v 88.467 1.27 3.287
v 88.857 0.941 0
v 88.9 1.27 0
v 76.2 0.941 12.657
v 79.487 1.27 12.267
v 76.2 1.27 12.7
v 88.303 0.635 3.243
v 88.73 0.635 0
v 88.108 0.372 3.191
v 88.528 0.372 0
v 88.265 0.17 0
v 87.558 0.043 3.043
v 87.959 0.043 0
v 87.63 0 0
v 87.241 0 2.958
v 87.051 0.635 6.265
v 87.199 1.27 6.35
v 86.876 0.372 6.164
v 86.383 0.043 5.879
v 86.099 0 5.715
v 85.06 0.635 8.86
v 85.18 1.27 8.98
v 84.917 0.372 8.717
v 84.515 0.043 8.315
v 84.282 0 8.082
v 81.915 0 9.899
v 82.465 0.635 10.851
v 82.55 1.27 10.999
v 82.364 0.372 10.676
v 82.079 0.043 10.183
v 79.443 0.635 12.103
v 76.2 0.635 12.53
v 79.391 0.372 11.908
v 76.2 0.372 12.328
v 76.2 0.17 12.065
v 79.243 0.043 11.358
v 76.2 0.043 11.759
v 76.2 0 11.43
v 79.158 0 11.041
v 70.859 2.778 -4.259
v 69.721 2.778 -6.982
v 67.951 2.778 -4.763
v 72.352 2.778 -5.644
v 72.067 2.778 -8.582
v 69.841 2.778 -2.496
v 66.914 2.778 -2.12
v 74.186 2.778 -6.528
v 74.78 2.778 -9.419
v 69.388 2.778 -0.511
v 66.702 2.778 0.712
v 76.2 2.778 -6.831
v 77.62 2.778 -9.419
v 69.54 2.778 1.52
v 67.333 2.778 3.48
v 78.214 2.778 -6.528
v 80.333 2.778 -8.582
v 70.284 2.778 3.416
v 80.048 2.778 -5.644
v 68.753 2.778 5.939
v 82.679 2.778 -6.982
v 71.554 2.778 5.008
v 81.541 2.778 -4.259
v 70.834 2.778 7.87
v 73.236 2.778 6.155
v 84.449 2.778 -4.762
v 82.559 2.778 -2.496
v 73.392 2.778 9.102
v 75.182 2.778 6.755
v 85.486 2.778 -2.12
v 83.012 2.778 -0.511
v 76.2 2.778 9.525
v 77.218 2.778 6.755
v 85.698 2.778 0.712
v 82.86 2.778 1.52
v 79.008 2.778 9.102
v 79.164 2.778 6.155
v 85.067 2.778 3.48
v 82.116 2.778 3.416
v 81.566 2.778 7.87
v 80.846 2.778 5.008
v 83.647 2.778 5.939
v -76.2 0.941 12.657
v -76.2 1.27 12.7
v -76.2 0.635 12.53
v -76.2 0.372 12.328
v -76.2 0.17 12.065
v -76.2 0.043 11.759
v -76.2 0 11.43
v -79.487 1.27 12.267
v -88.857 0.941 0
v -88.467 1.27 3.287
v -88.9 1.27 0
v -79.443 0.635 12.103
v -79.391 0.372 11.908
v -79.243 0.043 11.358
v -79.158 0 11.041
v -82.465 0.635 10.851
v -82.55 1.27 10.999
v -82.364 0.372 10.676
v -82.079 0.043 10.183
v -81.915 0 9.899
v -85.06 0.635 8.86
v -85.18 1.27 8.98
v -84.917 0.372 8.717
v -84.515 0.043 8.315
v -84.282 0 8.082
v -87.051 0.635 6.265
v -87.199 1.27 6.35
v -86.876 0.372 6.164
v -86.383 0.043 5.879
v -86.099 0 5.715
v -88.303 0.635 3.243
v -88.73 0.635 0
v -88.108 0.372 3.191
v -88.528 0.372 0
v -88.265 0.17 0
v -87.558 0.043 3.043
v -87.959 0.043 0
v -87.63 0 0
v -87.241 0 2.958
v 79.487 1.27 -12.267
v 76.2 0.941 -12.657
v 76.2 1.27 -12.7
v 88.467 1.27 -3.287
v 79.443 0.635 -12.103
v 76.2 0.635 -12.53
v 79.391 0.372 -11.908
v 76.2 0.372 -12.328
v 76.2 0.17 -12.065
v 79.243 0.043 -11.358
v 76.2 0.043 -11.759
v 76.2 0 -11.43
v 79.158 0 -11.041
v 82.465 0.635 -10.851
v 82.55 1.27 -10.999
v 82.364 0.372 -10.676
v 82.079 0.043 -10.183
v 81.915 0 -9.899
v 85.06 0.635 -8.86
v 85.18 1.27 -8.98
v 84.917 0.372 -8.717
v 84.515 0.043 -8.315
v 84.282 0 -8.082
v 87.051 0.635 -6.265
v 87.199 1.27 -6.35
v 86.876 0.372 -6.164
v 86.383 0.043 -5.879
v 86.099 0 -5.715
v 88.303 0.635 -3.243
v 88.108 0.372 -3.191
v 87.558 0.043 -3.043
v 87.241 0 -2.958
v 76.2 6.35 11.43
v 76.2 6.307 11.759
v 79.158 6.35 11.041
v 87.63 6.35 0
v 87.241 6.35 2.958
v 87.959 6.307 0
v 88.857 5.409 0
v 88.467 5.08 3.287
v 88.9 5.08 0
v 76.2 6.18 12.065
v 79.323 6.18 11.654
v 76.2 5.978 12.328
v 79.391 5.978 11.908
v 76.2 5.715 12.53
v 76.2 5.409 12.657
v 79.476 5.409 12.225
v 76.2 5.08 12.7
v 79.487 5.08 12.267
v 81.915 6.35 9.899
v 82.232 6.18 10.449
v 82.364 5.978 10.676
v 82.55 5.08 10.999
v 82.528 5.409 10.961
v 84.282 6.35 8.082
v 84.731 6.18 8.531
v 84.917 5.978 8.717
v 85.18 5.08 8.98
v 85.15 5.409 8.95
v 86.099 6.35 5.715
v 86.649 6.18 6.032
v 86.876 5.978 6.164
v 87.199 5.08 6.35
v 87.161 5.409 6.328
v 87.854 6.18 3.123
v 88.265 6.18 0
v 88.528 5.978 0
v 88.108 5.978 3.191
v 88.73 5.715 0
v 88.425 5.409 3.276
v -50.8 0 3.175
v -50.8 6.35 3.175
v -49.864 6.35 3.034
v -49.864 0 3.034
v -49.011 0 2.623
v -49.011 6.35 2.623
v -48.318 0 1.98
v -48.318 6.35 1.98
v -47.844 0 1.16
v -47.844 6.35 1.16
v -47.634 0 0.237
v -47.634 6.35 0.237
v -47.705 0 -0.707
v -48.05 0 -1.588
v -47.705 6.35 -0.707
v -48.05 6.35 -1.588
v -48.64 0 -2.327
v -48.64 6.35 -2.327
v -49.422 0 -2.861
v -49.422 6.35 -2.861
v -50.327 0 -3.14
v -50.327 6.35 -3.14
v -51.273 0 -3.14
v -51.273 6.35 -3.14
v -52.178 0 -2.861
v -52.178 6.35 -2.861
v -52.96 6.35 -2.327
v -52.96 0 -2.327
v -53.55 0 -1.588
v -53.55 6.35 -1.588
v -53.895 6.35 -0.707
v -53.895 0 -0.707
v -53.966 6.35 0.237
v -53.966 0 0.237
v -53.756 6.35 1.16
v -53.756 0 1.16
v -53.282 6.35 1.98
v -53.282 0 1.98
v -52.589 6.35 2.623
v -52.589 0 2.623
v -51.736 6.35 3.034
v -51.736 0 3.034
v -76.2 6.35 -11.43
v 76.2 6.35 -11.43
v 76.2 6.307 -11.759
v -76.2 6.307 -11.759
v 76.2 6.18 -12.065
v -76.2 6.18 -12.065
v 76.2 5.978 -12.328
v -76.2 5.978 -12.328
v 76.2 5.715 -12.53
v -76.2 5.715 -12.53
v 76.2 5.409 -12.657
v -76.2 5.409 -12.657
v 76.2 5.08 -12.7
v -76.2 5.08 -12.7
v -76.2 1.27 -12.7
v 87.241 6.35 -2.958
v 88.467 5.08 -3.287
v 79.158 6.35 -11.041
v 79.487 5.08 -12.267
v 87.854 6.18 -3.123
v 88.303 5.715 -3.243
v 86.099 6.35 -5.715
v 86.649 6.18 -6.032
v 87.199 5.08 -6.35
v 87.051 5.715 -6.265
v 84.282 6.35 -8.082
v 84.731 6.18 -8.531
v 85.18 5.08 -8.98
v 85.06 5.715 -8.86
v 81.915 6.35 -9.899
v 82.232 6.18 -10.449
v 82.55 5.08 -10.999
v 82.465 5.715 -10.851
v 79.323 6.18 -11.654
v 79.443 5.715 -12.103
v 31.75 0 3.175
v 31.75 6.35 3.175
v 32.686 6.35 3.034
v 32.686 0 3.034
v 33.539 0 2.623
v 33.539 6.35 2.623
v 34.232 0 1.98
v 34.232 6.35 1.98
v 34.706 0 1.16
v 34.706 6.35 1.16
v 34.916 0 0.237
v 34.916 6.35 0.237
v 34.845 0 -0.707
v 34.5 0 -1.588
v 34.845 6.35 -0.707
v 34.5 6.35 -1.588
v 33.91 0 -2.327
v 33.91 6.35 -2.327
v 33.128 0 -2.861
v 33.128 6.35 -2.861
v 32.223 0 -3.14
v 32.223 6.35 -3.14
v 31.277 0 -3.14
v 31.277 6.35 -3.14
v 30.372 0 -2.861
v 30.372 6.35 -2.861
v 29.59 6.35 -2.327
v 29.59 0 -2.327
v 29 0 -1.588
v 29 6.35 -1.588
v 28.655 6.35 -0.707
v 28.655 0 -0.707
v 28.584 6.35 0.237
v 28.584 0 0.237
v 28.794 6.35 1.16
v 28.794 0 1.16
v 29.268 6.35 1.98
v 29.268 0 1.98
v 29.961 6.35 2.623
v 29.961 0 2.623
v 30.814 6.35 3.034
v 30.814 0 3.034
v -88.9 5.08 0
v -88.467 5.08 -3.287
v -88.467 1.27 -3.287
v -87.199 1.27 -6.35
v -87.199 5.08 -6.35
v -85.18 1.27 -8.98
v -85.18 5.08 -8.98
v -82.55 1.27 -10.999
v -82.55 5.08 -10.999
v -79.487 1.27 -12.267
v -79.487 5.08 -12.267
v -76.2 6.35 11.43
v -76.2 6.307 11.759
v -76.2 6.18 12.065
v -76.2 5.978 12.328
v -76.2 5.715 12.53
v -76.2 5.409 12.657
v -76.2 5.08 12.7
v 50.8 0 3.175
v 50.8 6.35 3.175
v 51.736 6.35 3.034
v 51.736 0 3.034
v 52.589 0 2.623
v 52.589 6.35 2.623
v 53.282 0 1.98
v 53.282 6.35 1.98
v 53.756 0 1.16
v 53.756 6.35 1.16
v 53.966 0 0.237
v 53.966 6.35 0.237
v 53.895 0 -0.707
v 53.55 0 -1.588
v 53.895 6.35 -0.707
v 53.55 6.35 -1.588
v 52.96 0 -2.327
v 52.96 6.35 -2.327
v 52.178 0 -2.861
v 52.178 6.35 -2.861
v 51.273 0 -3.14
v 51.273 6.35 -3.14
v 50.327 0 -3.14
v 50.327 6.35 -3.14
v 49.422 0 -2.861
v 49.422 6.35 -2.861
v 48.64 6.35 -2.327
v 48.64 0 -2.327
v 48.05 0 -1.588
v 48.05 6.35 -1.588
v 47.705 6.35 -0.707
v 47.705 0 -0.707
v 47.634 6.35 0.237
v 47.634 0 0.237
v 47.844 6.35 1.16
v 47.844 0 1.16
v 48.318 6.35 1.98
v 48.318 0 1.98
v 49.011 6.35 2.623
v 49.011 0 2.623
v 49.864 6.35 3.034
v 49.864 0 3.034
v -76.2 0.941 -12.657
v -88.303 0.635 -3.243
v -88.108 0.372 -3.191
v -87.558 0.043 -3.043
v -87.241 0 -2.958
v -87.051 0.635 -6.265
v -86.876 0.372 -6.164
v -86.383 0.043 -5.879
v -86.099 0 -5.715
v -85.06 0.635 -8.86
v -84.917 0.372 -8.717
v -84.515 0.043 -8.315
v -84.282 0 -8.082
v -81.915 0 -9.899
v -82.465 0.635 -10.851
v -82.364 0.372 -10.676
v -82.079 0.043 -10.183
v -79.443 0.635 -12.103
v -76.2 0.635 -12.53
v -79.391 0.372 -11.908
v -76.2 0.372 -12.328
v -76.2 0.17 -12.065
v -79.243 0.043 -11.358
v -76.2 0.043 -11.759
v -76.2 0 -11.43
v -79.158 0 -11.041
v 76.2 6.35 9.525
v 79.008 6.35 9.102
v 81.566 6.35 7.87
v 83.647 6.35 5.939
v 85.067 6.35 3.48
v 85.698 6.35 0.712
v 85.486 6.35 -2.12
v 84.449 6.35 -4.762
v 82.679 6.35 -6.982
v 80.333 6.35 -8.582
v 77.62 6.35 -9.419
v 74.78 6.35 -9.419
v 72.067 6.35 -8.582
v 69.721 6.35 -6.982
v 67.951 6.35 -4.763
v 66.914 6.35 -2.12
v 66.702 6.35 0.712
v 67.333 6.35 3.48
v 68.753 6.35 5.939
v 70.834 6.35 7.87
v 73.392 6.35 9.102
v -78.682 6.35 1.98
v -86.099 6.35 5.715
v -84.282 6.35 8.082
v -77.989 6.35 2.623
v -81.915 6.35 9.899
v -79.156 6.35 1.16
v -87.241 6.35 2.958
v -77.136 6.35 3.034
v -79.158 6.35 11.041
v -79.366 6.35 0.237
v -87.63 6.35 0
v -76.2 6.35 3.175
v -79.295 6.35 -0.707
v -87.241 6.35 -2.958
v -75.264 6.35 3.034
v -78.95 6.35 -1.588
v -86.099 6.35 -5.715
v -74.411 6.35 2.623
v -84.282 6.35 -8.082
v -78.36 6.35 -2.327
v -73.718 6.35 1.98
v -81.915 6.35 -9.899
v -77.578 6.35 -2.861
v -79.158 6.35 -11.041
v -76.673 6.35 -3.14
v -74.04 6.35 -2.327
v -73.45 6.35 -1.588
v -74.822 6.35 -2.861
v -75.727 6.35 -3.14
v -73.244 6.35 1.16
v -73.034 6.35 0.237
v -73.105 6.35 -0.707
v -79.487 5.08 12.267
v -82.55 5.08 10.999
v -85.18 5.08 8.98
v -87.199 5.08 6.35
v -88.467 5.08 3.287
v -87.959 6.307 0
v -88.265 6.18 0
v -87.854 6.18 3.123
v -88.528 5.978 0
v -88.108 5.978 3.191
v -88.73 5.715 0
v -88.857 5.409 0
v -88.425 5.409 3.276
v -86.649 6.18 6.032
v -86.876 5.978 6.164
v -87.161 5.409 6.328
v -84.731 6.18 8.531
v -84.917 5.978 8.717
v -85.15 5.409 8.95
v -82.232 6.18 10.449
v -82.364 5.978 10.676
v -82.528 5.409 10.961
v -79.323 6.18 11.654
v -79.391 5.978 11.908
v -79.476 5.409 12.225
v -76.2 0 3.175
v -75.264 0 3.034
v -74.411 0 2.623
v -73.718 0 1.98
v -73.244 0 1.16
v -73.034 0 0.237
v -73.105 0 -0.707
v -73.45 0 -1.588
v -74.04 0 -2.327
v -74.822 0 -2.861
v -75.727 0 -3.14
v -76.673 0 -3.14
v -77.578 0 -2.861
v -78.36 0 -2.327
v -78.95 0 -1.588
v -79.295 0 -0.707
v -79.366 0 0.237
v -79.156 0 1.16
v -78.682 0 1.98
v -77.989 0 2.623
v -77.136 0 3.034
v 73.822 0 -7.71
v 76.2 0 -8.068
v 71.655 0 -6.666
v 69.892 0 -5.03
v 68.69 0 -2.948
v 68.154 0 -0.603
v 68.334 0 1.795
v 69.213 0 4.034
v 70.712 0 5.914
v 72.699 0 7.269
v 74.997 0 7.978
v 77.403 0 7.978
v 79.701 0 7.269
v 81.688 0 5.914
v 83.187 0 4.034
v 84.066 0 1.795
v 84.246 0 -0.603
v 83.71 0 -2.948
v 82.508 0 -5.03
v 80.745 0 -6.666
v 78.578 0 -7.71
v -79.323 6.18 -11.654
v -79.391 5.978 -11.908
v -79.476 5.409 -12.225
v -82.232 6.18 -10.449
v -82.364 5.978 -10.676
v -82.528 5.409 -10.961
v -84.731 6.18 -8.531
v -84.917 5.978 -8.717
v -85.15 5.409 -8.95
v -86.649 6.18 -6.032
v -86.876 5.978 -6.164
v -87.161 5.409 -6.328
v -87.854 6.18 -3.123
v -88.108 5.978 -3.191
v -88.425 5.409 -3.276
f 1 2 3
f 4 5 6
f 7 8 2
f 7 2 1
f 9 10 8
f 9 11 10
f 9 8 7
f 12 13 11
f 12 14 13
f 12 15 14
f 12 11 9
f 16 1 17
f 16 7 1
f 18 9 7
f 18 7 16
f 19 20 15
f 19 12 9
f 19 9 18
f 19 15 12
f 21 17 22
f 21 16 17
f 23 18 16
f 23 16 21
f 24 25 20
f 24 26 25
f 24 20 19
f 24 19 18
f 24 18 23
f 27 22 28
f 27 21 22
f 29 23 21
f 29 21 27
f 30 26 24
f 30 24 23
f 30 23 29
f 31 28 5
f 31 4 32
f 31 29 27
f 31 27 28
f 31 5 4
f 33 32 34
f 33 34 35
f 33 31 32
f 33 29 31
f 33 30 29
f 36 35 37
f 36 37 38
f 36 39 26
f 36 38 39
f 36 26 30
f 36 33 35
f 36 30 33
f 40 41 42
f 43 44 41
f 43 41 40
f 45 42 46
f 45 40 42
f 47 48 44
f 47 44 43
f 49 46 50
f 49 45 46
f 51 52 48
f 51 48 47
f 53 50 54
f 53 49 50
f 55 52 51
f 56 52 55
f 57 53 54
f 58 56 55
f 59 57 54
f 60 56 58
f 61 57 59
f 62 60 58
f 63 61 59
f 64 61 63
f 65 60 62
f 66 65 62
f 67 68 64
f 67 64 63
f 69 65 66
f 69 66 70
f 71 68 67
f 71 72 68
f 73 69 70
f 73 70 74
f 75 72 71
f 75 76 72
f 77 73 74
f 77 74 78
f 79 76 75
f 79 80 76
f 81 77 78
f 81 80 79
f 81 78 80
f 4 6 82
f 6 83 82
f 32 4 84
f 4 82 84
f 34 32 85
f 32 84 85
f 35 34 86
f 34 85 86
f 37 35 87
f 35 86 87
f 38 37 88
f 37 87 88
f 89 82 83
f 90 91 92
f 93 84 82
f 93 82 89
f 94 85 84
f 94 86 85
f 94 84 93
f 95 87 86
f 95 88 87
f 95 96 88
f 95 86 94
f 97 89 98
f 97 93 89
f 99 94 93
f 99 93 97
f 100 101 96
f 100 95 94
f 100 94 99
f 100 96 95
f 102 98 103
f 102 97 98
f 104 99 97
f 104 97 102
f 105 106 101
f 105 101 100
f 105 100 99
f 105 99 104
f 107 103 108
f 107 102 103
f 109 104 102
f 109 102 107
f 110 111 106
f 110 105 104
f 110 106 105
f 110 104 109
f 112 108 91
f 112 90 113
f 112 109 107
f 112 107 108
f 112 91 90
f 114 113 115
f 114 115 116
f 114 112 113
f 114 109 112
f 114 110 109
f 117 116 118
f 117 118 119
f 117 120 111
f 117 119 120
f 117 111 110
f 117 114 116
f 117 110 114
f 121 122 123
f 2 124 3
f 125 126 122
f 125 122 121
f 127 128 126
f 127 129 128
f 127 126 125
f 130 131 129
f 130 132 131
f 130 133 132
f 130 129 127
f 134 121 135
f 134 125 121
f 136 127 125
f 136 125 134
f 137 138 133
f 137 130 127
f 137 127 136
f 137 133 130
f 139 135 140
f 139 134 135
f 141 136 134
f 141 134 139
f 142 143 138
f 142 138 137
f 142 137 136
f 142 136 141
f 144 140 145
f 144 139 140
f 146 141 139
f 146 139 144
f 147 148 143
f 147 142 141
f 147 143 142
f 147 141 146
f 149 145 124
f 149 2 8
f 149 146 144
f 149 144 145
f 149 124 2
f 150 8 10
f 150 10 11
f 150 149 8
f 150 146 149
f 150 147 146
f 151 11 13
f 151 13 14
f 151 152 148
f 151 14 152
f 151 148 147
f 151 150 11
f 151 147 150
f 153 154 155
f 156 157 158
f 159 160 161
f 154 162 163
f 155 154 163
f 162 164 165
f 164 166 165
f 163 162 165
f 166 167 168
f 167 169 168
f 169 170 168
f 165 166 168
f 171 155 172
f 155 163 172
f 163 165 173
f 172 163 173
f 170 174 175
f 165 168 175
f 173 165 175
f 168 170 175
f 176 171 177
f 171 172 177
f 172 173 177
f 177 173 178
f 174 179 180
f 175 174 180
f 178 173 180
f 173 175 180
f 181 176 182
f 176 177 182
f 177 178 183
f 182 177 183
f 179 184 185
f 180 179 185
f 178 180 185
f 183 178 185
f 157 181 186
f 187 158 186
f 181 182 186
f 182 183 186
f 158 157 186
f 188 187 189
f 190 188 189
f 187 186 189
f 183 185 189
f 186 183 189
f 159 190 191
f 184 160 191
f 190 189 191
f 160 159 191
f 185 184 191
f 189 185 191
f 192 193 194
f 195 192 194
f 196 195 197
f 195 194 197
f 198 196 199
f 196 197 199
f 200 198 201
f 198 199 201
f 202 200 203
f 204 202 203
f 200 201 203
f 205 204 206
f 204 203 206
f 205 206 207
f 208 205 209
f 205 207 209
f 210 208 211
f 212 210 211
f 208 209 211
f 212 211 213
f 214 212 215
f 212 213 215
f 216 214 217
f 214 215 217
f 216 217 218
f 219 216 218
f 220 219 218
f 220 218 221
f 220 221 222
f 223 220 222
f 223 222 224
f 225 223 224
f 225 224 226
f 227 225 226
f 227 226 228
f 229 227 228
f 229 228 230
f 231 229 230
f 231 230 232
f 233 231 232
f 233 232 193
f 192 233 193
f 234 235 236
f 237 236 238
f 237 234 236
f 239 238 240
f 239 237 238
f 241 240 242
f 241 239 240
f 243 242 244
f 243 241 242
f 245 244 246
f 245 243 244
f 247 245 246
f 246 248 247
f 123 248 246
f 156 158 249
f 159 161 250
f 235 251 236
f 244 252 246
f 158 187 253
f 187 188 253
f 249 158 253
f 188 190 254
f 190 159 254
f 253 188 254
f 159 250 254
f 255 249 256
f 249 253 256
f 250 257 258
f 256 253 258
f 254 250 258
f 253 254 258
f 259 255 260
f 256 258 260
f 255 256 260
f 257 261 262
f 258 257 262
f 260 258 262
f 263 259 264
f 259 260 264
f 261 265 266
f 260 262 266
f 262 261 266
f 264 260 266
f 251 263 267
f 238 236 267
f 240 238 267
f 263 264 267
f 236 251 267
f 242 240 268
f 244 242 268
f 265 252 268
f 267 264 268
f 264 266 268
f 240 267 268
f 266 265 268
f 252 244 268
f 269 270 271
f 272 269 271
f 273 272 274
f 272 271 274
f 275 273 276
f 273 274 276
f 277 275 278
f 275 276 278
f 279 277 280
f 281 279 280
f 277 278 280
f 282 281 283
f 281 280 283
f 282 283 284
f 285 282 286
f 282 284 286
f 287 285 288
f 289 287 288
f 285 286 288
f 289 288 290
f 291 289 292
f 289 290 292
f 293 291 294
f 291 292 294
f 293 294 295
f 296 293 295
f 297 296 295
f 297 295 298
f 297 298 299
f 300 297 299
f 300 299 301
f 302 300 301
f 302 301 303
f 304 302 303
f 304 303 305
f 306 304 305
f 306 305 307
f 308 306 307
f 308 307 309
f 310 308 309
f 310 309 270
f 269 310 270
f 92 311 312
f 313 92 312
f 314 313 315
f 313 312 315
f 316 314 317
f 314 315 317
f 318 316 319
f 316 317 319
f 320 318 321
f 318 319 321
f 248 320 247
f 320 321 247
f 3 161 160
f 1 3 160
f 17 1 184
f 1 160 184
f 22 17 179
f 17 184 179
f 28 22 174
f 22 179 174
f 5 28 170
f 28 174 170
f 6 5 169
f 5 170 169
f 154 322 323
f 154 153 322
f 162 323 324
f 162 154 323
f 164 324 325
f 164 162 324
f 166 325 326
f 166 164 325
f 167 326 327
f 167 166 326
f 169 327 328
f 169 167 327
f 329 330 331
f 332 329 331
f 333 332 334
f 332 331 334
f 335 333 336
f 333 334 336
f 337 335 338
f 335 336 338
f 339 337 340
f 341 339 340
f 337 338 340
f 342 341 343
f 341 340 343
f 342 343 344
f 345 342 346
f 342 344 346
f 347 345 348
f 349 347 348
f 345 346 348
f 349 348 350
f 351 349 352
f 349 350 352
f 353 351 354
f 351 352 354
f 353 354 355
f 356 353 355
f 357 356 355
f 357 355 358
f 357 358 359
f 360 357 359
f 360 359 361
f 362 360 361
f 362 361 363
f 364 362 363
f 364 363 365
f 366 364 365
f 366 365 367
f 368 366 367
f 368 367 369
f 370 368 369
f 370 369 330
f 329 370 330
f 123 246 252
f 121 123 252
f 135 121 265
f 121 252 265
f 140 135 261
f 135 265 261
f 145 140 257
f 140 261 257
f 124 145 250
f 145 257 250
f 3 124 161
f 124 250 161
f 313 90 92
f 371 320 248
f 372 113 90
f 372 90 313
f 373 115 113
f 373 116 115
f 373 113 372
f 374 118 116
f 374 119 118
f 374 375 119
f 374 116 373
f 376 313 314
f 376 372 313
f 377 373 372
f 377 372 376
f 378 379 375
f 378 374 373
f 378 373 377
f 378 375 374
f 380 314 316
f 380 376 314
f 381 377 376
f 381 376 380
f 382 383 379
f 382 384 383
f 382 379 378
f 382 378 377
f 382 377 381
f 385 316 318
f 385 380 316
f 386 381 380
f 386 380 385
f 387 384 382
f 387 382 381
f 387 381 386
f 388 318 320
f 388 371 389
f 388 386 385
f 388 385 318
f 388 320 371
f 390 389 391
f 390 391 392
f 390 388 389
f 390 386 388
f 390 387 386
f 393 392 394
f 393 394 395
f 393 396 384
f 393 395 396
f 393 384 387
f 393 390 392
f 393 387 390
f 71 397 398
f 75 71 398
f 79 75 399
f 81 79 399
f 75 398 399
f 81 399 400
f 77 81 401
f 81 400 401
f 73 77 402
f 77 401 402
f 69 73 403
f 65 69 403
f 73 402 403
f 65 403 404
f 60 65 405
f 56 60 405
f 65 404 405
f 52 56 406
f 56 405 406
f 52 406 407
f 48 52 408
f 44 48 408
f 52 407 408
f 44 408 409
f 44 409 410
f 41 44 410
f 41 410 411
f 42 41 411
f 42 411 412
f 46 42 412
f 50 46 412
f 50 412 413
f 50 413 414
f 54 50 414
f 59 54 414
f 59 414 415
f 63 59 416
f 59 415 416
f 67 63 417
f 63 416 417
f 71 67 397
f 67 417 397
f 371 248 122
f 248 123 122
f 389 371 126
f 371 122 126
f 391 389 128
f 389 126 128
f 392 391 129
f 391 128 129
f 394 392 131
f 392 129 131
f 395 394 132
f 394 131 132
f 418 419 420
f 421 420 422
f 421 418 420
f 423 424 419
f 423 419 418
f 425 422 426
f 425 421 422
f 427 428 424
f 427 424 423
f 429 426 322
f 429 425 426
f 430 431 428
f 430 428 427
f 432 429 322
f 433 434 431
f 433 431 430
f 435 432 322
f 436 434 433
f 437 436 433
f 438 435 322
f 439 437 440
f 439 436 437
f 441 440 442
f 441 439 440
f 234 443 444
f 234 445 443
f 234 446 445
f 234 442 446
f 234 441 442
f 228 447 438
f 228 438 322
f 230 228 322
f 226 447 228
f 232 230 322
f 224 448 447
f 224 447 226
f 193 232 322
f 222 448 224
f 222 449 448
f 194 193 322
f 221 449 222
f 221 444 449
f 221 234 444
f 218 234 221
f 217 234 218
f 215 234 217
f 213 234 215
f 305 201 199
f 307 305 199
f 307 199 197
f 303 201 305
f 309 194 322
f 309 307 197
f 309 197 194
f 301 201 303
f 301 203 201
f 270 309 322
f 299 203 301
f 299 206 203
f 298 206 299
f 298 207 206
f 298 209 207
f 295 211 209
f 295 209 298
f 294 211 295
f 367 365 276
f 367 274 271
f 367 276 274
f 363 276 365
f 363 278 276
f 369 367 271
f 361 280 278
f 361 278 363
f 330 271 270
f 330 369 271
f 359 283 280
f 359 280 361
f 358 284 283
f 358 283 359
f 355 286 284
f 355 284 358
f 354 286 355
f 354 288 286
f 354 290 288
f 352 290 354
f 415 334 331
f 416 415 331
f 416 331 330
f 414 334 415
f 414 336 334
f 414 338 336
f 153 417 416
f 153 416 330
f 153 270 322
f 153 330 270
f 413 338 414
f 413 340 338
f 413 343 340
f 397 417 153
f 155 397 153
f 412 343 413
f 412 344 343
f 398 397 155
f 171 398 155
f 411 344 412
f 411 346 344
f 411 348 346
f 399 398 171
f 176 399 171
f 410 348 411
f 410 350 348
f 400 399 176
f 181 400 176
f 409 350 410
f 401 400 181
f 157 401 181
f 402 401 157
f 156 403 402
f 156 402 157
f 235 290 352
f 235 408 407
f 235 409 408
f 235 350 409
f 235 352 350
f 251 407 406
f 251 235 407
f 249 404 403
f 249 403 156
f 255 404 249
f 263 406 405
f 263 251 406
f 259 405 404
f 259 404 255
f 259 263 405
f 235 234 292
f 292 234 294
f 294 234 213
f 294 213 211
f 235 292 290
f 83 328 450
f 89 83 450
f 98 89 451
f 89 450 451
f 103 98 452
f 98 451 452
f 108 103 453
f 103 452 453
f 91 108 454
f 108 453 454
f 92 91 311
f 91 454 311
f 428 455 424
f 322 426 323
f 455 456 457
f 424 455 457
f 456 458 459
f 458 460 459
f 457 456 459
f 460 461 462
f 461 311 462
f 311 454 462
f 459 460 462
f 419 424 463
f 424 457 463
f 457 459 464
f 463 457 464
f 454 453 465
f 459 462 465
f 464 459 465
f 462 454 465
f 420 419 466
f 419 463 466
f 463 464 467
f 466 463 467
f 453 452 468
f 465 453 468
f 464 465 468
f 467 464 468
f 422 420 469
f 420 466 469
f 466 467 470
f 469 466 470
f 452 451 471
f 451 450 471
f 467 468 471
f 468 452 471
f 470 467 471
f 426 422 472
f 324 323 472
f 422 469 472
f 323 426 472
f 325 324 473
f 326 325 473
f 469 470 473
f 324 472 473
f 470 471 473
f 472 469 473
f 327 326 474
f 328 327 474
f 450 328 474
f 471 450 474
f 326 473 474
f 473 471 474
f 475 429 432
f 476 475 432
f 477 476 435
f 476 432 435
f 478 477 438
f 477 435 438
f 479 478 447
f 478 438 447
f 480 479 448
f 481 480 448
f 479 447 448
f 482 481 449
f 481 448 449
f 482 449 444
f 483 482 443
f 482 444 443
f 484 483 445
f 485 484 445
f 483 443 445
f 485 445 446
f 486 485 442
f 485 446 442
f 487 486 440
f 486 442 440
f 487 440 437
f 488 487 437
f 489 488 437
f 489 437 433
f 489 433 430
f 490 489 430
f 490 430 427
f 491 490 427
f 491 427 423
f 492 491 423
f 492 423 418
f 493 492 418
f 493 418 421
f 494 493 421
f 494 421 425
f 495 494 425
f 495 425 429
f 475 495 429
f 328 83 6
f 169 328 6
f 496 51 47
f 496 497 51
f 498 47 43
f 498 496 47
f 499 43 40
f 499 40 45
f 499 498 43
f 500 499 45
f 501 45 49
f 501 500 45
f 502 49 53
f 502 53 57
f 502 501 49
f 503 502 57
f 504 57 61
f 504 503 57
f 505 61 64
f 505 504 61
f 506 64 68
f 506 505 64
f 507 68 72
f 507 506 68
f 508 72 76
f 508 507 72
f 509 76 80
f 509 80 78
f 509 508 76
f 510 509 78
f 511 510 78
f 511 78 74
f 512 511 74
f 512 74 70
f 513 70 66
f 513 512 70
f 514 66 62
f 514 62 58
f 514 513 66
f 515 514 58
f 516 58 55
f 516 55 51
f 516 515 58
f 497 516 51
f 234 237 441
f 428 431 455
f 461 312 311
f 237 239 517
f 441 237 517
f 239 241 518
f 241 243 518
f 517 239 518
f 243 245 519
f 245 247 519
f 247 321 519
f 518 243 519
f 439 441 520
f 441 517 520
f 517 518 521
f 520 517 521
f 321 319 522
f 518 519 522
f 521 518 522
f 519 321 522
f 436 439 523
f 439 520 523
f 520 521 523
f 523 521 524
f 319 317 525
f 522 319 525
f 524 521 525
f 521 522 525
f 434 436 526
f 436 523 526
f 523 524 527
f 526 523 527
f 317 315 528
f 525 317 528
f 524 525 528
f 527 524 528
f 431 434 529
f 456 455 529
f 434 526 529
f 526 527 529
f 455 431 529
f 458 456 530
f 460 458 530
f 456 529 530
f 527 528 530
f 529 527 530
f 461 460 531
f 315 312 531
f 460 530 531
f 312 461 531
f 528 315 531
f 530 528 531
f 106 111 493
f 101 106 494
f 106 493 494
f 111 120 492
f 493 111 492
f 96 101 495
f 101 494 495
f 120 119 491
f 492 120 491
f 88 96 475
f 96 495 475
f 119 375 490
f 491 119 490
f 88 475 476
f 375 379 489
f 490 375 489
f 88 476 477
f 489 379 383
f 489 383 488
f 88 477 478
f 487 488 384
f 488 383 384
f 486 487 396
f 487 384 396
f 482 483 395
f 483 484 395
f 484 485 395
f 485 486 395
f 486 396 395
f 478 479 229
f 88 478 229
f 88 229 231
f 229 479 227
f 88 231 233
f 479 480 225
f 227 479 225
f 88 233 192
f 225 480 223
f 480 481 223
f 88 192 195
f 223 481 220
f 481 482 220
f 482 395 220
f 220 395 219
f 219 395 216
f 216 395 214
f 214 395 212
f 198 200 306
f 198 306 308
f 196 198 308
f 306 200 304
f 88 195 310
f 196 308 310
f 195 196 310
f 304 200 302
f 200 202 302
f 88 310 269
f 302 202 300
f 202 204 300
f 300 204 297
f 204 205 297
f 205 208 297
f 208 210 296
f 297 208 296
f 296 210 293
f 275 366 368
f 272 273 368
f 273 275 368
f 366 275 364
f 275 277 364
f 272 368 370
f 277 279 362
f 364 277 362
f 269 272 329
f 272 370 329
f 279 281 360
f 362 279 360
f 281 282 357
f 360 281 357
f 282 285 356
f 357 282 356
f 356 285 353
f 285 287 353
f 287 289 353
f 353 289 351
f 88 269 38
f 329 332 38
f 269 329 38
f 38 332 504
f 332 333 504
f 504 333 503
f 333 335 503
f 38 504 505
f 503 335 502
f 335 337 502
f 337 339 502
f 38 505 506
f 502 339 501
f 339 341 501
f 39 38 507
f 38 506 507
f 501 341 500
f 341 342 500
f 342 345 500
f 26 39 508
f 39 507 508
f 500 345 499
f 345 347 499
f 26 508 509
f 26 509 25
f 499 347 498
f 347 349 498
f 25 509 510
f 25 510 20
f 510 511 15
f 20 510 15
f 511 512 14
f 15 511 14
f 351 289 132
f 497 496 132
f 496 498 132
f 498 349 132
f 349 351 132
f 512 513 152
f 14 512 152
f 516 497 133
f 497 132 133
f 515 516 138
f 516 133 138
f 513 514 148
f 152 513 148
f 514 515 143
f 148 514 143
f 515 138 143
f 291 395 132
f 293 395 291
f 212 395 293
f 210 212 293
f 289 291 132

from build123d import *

# Parameters (mm, degrees)
SKETCH1_W           = 177.8
SKETCH1_H           = 25.4
BOSS_EXTRUDE1_DEPTH = 6.35
SKETCH2_R           = 3.175
SKETCH2_R_2         = 6.35
CUT_EXTRUDE1_DEPTH  = 91.02678768
SKETCH3_R           = 9.525
CUT_EXTRUDE2_DEPTH  = 3.571875
SKETCH4_R           = 3.175
CUT_EXTRUDE3_DEPTH  = 91.02678768
CUT_EXTRUDE4_DEPTH  = 91.02678768
FILLET1_R           = 1.27


with BuildPart() as part:
    # Sketch1 → Boss-Extrude1 (new body)
    with BuildSketch(Plane(origin=(0, 0, 0), x_dir=(1, 0, 0), z_dir=(0, 1, 0))):
        Rectangle(SKETCH1_W, SKETCH1_H)
    extrude(amount=BOSS_EXTRUDE1_DEPTH)

    # Sketch2 → Cut-Extrude1 (cut, through all)
    with BuildSketch(Plane(origin=(0, 6.35, 0), x_dir=(1, 0, 0), z_dir=(0, 1, 0))):
        with Locations(Location((-76.2, 0, 0), (0, 0, 270))):
            Circle(SKETCH2_R)
        with Locations(Location((76.2, 0, 0), (0, 0, 270))):
            Circle(SKETCH2_R_2)
        with Locations(Location((-50.8, 0, 0), (0, 0, 270))):
            Circle(SKETCH2_R)
    extrude(amount=-CUT_EXTRUDE1_DEPTH, mode=Mode.SUBTRACT)

    # Sketch3 → Cut-Extrude2 (cut)
    with BuildSketch(Plane(origin=(0, 6.35, 0), x_dir=(1, 0, 0), z_dir=(0, 1, 0))):
        with Locations(Location((76.2, 0, 0), (0, 0, 270))):
            Circle(SKETCH3_R)
    extrude(amount=-CUT_EXTRUDE2_DEPTH, mode=Mode.SUBTRACT)

    # Sketch4 → Cut-Extrude3 (cut, through all)
    with BuildSketch(Plane(origin=(0, 6.35, 0), x_dir=(1, 0, 0), z_dir=(0, 1, 0))):
        with Locations(Location((50.8, 0, 0), (0, 0, 270))):
            Circle(SKETCH4_R)
        with Locations(Location((31.75, 0, 0), (0, 0, 270))):
            Circle(SKETCH4_R)
    extrude(amount=-CUT_EXTRUDE3_DEPTH, mode=Mode.SUBTRACT)

    # Sketch5 → Cut-Extrude4 (cut, through all)
    with BuildSketch(Plane(origin=(0, 6.35, 0), x_dir=(1, 0, 0), z_dir=(0, 1, 0))):
        with BuildLine():
            Line((88.9, 12.7), (76.2, 12.7))
            ThreePointArc((76.2, 12.7), (85.180256121, 8.980256121), (88.9, 0))
            Line((88.9, 0), (88.9, 12.7))
        make_face()
        with BuildLine():
            ThreePointArc((88.9, 0), (85.180256121, -8.980256121), (76.2, -12.7))
            Line((76.2, -12.7), (88.9, -12.7))
            Line((88.9, -12.7), (88.9, 0))
        make_face()
        with BuildLine():
            ThreePointArc((-88.9, 0), (-85.180256121, 8.980256121), (-76.2, 12.7))
            Line((-76.2, 12.7), (-88.9, 12.7))
            Line((-88.9, 12.7), (-88.9, 0))
        make_face()
        with BuildLine():
            Line((-88.9, -12.7), (-76.2, -12.7))
            ThreePointArc((-76.2, -12.7), (-85.180256121, -8.980256121), (-88.9, 0))
            Line((-88.9, 0), (-88.9, -12.7))
        make_face()
    extrude(amount=-CUT_EXTRUDE4_DEPTH, mode=Mode.SUBTRACT)

    # Fillet1
    fillet1_edges = [part.edges().sort_by_distance(p)[0] for p in [
        (0, 0, -12.7),
        (0, 0, 12.7),
        (0, 6.35, 12.7),
        (0, 6.35, -12.7),
        (88.9, 6.35, 0),
        (88.9, 0, 0),
        (-88.9, 6.35, 0),
        (-88.9, 0, 0),
    ]]
    fillet(fillet1_edges, radius=FILLET1_R)

    # Sketch6 → Cut-Revolve2 (revolve, cut)
    with BuildSketch(Plane.ZY.offset(-76.2)):
        Polygon((-8.06821119, 0), (-6.35, 0), (-6.35, 2.778125), (-6.831310248, 2.778125), align=None)
    revolve(axis=Axis((76.2, 0, 0), (0, 1, 0)), mode=Mode.SUBTRACT)


solid = part.part
